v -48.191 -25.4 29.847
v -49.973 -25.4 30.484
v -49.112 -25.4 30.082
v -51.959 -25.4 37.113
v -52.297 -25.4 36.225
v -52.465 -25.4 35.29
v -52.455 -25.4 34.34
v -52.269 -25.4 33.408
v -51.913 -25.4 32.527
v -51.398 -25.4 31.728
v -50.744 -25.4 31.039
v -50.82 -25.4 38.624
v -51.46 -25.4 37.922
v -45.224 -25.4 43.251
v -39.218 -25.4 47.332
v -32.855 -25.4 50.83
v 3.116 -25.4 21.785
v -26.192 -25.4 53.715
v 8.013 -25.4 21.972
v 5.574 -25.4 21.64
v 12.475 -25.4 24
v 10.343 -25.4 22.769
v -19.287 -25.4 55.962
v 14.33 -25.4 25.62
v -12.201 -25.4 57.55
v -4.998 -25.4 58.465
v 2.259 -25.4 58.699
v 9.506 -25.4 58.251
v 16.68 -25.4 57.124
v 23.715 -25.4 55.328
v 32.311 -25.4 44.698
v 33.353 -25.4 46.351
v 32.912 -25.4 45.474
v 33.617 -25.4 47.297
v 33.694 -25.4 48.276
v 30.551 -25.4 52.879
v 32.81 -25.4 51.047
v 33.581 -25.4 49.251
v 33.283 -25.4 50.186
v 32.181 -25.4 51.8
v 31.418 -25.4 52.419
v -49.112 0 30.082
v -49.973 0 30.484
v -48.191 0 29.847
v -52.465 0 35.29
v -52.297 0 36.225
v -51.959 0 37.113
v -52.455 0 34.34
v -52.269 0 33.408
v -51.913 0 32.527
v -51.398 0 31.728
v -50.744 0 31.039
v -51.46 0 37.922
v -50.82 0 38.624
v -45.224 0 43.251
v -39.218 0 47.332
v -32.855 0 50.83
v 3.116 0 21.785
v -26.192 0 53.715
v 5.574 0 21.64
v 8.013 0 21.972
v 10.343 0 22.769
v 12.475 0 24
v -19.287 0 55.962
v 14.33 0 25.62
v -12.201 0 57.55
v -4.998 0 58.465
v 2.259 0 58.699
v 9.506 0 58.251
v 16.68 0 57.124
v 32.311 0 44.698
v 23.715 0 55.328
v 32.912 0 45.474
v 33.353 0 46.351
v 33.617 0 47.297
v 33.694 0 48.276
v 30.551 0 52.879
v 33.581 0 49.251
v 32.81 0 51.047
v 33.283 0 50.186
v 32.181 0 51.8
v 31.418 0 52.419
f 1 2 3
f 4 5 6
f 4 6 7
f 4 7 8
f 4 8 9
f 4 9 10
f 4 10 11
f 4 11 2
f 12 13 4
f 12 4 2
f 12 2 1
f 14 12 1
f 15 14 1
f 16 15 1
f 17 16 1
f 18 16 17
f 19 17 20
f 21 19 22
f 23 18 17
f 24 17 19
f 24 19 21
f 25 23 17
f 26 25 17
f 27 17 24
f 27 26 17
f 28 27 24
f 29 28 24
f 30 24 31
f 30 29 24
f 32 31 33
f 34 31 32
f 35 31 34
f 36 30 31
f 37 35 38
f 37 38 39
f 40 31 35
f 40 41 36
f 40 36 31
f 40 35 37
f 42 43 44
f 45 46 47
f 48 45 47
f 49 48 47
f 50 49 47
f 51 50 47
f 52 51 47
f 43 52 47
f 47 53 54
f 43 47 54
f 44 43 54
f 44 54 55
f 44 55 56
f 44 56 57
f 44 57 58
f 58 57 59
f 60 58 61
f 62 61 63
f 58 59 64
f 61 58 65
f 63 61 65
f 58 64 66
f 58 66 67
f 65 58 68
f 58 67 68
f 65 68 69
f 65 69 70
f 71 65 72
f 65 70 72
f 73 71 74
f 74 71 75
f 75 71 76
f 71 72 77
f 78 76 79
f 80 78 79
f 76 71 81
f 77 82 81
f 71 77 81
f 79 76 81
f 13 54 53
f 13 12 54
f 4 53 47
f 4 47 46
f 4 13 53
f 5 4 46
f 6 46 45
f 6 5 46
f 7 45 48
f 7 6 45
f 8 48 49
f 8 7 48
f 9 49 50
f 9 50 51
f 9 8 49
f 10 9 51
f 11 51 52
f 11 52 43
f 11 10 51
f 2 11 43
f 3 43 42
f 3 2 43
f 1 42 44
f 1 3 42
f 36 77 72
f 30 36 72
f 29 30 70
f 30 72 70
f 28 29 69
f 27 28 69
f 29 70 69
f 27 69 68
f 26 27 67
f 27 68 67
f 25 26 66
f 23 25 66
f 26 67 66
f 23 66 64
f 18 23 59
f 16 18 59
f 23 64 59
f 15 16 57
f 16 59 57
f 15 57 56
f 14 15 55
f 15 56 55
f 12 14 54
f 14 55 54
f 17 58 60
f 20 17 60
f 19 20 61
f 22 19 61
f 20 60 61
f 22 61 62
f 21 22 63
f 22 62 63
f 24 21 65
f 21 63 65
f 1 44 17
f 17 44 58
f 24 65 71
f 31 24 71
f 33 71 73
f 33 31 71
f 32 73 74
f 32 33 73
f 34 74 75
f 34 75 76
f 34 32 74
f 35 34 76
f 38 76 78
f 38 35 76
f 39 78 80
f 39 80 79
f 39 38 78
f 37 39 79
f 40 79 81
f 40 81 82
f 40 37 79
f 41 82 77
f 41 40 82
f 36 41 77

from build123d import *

# Parameters (mm, degrees)
F1_DEPTH = 25.4
F2_R     = 5.08


with BuildPart() as f1:
    # F0 (on Front) → F1 (new body)
    with BuildSketch(Plane.XZ):
        with BuildLine():
            Line((14.329544, 25.6199), (37.121165, 49.801257))
            ThreePointArc((37.121165, 49.801257), (-13.598421, 57.291577), (-57.827495, 31.361472))
            Line((-57.827495, 31.361472), (3.116123, 21.784617))
            ThreePointArc((3.116123, 21.784617), (9.197626, 22.314083), (14.329544, 25.6199))
        make_face()
    extrude(amount=F1_DEPTH)

    # F2
    f2_edges = [f1.edges().sort_by_distance(p)[0] for p in [
        (-57.827495, -12.7, 31.361472),
        (37.121165, -12.7, 49.801257),
    ]]
    fillet(f2_edges, radius=F2_R)


solid = f1.part
